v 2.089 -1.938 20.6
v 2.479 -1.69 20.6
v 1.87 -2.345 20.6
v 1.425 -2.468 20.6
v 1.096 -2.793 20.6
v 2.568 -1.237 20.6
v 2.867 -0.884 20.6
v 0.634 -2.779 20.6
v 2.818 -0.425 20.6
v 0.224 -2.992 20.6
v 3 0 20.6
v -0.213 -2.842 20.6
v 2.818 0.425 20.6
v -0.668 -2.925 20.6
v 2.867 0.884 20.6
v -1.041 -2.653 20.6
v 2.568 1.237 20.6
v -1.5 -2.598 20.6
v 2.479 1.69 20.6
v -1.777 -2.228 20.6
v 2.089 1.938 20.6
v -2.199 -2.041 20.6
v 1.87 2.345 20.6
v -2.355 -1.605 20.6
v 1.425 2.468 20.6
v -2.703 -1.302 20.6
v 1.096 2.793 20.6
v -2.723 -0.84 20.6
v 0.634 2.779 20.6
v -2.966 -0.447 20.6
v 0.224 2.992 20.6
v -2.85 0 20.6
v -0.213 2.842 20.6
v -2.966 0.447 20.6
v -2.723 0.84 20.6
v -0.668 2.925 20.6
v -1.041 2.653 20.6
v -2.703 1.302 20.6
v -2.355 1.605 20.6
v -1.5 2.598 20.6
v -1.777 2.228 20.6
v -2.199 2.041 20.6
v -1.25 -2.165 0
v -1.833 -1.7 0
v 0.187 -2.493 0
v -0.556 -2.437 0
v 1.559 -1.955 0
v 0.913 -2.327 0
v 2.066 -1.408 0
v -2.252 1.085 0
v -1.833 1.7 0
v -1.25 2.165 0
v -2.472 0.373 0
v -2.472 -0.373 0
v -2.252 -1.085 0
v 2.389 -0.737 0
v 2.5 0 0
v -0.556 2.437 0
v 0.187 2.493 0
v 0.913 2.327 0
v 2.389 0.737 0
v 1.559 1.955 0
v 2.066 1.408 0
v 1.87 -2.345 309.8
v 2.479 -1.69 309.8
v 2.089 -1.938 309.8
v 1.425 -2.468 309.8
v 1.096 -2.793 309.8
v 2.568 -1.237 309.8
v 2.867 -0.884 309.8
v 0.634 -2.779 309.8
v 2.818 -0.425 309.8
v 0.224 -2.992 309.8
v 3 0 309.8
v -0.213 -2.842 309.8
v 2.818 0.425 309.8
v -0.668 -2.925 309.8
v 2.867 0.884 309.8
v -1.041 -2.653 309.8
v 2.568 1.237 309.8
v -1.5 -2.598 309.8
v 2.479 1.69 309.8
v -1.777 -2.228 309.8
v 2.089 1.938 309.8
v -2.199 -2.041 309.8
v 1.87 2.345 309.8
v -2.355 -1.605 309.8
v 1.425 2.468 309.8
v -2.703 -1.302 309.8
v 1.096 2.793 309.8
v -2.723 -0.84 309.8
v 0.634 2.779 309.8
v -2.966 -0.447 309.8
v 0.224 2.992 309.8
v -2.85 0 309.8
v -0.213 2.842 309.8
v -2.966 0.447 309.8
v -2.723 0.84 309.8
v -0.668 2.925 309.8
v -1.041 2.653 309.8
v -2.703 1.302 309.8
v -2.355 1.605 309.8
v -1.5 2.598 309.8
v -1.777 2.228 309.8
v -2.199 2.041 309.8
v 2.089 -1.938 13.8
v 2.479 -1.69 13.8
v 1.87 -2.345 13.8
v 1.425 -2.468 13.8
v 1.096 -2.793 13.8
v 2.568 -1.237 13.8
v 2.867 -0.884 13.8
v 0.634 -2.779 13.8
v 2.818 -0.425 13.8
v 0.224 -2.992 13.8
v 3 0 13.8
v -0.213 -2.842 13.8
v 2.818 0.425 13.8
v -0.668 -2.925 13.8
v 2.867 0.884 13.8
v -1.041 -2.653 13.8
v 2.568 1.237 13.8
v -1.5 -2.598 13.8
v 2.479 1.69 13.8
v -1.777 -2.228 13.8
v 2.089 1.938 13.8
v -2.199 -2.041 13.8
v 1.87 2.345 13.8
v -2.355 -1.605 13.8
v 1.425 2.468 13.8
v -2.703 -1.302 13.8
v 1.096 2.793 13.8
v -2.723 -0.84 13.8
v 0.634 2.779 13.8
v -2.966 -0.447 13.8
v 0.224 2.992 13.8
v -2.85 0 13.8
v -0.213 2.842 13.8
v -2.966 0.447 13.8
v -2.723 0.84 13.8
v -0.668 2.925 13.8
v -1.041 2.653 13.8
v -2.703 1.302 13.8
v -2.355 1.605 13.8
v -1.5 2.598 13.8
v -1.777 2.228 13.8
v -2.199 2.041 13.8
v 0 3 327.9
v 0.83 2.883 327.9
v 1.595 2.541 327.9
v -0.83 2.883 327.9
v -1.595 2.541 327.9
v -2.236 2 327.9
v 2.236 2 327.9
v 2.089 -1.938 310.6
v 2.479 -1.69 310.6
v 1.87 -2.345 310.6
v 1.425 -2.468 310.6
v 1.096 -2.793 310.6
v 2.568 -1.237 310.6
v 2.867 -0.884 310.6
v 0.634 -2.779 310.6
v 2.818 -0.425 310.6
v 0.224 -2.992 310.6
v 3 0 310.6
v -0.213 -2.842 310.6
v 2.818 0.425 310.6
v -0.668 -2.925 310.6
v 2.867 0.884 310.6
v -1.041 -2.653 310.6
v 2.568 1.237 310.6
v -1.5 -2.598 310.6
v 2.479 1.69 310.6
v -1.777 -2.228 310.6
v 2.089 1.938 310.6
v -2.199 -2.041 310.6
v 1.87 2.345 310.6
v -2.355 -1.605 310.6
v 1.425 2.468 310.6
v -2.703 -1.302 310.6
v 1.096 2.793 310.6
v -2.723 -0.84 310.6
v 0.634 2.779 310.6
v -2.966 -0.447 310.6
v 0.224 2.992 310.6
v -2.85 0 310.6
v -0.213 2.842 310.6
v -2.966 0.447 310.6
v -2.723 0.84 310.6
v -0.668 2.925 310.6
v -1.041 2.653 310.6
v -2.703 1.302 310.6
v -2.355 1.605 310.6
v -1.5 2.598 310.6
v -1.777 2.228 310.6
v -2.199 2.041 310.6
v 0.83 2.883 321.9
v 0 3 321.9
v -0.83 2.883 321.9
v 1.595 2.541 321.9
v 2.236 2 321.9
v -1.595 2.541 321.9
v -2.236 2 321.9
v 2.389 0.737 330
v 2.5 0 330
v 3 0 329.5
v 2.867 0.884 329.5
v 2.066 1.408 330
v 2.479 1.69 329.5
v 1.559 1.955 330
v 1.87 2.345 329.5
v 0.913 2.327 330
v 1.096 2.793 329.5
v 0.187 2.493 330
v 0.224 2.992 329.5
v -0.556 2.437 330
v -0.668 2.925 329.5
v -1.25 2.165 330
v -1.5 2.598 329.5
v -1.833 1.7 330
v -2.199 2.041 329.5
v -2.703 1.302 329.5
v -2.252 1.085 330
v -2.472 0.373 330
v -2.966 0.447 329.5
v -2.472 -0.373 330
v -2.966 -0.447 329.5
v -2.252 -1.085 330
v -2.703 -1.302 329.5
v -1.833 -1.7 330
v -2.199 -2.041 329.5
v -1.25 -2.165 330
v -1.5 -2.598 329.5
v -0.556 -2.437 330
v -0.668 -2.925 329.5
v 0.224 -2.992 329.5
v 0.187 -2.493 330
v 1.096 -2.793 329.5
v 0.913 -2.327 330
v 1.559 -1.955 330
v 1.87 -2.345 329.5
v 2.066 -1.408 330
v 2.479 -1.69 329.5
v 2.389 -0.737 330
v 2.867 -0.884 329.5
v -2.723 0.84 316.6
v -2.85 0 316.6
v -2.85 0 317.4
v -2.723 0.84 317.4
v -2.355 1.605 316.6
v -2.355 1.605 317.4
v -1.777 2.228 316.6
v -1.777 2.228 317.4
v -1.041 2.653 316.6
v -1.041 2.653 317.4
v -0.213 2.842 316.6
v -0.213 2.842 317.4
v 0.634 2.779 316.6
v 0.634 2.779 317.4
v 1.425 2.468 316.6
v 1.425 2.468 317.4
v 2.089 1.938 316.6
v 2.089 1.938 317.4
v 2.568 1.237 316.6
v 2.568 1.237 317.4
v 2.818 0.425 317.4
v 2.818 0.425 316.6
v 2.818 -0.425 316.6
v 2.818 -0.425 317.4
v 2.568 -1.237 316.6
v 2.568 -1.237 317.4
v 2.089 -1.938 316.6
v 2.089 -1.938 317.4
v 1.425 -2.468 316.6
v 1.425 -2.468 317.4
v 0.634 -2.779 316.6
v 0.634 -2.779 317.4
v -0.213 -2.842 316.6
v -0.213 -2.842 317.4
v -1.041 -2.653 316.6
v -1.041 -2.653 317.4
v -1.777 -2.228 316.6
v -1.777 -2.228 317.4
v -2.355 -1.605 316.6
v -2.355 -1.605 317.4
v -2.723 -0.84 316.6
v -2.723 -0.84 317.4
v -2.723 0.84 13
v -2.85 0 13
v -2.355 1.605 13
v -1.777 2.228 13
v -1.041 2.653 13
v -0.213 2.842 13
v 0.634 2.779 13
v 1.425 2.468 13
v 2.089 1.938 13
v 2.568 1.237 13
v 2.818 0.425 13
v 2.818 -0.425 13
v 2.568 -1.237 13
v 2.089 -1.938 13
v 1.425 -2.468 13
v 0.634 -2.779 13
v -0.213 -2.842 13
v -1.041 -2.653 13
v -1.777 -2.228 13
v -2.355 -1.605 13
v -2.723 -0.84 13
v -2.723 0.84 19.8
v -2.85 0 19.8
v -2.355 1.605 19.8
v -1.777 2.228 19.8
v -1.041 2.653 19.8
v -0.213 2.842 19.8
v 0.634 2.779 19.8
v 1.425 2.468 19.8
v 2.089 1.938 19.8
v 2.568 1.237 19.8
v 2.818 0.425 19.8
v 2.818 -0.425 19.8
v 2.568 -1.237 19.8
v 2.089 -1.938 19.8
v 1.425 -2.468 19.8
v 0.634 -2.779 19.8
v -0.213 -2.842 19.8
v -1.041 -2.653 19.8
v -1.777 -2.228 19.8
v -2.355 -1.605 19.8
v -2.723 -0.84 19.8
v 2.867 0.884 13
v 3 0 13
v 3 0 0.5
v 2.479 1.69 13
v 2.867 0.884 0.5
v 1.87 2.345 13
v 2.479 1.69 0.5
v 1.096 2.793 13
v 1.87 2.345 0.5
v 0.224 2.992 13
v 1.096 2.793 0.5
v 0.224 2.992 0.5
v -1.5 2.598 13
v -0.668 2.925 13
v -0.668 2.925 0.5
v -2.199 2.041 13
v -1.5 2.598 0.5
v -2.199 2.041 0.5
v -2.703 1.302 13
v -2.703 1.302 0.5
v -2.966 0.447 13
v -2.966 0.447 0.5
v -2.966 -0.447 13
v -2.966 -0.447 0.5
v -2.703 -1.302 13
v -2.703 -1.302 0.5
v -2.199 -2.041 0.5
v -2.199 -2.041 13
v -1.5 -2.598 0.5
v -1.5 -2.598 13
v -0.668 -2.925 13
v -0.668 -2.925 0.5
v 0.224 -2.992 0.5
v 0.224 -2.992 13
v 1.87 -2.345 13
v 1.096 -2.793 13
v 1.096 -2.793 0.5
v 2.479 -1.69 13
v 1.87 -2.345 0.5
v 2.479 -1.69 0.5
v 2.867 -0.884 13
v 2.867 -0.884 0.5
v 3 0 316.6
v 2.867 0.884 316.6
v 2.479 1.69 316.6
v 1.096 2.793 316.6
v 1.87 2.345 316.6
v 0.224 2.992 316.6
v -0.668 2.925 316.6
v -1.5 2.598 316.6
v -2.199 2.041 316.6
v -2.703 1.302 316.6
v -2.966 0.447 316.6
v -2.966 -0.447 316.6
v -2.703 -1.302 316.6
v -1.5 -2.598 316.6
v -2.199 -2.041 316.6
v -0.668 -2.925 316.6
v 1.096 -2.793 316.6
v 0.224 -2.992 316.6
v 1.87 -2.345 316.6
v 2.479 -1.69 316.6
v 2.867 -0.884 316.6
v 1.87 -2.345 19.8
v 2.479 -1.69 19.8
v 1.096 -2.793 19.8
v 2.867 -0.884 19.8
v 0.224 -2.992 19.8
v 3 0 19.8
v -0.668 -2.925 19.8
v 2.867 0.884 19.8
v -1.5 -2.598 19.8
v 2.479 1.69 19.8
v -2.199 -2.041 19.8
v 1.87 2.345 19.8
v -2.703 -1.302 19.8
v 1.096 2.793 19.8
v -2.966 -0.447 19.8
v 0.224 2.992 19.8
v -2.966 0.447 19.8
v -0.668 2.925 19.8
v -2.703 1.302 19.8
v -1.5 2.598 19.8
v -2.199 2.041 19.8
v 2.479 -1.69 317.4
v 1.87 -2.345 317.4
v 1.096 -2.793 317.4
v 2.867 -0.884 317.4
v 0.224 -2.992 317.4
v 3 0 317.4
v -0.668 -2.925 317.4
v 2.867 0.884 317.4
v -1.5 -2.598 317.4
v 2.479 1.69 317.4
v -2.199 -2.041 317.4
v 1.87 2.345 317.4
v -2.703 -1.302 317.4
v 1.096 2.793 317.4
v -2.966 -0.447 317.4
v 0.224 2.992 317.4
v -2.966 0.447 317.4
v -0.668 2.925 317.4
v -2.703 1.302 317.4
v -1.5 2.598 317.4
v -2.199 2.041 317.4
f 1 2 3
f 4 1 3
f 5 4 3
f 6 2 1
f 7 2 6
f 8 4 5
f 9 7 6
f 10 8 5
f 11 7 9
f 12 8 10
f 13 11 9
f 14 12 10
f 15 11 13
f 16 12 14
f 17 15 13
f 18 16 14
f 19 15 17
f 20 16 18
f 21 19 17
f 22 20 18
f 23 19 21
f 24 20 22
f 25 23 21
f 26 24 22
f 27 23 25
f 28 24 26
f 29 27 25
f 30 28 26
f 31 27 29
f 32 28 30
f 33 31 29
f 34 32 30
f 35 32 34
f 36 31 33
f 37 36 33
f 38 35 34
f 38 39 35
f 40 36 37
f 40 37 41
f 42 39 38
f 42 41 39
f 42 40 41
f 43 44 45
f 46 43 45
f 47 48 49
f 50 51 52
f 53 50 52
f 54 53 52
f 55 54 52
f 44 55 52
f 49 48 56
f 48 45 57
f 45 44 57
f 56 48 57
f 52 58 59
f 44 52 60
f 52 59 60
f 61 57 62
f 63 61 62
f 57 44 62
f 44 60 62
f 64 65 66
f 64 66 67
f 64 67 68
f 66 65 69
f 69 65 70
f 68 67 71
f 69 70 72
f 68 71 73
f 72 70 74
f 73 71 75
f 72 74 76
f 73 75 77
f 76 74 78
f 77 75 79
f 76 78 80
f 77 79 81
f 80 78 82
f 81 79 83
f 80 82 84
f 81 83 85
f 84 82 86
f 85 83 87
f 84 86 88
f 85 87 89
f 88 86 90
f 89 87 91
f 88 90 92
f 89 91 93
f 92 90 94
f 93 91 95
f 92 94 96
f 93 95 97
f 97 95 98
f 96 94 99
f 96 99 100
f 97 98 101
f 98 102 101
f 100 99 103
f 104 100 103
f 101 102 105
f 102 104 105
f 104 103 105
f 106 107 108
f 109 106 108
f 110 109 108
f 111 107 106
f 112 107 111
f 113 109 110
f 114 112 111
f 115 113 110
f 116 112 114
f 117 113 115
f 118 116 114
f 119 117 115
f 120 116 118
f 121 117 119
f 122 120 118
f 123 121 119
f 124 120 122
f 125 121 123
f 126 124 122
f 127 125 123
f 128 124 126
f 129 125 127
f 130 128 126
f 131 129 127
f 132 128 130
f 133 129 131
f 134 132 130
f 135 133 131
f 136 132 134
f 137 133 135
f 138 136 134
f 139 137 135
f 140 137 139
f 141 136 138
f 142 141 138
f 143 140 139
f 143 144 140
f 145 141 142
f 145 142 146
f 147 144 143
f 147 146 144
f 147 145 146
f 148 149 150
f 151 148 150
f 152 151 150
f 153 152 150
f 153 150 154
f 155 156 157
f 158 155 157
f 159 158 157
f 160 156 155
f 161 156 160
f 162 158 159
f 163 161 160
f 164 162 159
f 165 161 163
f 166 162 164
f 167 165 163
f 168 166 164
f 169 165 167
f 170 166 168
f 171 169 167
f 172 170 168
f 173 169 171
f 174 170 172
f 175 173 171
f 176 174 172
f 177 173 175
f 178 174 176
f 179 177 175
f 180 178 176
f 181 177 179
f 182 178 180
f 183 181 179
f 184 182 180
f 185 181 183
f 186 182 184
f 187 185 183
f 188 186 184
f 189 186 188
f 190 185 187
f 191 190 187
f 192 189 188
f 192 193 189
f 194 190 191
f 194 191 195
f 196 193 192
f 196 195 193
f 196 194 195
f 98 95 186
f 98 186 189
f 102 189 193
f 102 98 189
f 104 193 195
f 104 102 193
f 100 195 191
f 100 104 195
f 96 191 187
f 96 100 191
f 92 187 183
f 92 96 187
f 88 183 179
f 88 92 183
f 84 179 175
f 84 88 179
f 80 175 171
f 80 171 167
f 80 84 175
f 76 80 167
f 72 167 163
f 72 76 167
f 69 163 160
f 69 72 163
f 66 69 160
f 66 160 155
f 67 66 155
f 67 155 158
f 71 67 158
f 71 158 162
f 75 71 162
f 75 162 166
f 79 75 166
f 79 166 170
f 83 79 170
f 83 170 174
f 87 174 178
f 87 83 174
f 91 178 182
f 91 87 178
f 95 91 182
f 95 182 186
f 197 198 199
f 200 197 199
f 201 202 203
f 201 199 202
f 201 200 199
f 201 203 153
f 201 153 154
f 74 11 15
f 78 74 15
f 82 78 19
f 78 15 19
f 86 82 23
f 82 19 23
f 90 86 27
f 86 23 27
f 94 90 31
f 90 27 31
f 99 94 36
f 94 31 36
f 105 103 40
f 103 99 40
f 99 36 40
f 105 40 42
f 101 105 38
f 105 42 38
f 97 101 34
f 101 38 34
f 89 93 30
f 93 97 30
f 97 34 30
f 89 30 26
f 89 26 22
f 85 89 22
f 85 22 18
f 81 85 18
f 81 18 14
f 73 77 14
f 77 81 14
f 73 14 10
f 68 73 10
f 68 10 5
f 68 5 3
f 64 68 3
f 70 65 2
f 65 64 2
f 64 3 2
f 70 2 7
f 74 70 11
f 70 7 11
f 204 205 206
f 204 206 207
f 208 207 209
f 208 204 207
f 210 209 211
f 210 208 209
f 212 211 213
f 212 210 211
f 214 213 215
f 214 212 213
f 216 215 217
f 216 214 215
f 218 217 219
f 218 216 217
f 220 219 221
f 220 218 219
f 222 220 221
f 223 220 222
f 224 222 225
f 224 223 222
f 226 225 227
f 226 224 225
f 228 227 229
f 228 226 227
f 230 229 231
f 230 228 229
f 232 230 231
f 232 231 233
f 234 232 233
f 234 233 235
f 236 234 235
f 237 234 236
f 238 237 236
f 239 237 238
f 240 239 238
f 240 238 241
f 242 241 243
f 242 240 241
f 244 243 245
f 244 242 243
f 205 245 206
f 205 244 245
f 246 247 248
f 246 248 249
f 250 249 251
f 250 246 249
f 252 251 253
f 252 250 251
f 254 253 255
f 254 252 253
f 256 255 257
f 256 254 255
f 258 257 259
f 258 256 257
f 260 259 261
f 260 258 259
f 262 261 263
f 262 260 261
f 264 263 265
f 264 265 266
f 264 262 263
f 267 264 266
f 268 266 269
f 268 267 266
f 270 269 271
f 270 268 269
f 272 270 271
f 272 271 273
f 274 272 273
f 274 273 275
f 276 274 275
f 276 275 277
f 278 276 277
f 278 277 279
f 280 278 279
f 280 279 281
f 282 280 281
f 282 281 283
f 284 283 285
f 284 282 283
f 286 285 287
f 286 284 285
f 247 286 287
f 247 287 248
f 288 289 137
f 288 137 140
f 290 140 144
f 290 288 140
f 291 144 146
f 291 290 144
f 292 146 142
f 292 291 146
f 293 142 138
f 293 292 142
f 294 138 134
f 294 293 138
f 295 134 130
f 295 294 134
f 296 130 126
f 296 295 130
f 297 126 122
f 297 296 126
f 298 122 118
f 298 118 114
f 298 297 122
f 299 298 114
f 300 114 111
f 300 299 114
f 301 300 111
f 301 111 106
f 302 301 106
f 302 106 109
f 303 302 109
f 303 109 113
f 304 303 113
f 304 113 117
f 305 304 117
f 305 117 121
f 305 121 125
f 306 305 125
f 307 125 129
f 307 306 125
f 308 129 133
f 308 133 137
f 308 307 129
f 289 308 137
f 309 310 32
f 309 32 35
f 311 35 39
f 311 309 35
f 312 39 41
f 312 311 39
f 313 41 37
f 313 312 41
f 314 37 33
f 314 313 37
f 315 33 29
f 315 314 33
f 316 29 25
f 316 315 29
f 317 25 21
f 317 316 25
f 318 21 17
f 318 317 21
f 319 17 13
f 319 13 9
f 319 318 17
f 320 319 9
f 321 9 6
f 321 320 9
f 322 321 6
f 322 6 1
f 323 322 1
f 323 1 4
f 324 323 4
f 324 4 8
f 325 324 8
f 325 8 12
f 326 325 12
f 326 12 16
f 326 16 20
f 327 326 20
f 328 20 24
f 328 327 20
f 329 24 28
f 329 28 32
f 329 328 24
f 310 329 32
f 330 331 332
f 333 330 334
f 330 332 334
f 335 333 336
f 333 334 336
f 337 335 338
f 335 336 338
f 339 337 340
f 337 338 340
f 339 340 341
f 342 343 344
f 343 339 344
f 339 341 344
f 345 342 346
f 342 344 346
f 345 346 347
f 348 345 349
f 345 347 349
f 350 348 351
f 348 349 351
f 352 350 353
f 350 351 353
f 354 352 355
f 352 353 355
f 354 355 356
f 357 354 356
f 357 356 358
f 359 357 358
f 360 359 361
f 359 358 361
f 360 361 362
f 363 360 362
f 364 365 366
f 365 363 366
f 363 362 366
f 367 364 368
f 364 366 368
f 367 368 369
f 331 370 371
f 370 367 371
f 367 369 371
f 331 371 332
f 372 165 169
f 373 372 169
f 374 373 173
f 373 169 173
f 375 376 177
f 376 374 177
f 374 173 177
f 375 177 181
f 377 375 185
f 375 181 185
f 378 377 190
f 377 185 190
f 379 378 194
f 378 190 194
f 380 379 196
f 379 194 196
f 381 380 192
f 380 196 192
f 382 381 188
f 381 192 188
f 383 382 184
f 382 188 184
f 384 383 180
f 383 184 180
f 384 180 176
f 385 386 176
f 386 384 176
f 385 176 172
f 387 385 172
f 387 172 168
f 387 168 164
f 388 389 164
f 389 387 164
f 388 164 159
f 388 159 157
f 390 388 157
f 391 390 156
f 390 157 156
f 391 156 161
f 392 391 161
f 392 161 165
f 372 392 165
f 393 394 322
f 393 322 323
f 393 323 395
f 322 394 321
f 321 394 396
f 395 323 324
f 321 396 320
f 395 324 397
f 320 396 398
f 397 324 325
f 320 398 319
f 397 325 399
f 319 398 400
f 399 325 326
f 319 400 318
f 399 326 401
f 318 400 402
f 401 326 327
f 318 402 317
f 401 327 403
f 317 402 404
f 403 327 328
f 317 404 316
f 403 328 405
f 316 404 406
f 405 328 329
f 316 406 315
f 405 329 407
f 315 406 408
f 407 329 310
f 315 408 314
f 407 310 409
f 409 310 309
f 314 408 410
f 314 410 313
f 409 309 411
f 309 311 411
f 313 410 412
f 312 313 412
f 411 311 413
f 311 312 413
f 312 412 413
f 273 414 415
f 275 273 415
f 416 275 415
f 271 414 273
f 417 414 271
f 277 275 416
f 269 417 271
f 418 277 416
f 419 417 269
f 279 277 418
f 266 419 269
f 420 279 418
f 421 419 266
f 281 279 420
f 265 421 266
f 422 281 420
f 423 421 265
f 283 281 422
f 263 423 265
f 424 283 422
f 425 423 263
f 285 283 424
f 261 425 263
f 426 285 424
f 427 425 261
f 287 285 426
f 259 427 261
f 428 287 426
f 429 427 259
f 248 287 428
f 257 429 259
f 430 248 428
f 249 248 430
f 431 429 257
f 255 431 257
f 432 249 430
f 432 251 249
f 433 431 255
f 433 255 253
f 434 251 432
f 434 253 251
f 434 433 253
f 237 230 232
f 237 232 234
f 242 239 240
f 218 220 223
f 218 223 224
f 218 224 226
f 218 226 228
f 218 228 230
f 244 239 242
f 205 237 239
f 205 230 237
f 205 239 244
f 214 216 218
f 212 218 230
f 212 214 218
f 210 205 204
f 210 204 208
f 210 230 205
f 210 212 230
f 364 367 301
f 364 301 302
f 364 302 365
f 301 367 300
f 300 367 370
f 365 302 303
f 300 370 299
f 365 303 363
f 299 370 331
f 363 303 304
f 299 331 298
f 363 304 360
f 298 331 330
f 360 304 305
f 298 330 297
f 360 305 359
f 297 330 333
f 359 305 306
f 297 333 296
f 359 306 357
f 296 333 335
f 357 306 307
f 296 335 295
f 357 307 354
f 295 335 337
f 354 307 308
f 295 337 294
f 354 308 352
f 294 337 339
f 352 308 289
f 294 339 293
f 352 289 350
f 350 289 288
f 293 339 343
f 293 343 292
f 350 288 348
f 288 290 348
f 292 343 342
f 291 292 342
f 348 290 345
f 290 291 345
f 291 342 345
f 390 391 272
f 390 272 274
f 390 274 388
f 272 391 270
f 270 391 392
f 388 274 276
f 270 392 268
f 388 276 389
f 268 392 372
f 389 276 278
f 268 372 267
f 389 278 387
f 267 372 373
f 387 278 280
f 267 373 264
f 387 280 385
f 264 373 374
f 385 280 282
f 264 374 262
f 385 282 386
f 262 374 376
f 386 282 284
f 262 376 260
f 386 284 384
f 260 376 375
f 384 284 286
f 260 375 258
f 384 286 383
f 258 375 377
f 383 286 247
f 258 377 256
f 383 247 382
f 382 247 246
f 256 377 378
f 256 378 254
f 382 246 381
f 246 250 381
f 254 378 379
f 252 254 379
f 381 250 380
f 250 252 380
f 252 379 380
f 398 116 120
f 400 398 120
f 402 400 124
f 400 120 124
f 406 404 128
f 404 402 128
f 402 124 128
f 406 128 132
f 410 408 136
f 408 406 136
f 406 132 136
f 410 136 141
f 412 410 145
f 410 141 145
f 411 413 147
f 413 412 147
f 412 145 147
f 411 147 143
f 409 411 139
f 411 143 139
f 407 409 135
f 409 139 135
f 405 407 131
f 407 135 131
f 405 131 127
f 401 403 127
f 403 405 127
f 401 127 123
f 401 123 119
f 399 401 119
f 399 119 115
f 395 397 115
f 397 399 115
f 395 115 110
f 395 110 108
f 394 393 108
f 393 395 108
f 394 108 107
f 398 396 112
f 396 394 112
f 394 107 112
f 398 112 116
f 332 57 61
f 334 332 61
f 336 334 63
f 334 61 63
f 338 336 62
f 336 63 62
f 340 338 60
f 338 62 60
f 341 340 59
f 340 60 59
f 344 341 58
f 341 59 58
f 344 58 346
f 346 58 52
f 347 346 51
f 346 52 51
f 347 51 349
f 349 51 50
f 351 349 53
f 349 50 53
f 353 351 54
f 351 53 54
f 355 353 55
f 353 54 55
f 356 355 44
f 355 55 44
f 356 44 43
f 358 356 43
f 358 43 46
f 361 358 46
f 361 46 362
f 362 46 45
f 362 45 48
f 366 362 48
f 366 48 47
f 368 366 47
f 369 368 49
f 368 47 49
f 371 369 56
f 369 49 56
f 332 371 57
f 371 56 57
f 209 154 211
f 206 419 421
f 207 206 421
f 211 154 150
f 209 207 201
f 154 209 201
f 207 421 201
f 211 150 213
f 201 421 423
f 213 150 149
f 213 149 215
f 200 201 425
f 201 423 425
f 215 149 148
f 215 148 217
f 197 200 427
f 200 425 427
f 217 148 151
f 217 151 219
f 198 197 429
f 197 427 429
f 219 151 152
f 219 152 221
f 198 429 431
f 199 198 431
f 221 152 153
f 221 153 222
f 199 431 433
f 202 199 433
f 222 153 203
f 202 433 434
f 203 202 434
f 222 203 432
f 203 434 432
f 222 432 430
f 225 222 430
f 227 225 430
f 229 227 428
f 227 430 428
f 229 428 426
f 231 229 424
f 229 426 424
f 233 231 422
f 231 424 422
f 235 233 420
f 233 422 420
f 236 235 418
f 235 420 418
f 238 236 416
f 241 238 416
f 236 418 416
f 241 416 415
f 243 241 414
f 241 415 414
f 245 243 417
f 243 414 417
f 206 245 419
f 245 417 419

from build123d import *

# Parameters (mm, degrees)
SKETCH1_R           = 3
BOSS_EXTRUDE1_DEPTH = 330
CUT_EXTRUDE1_START  = -13
SKETCH2_R           = 3
SKETCH2_R_2         = 2.85
CUT_EXTRUDE1_DEPTH  = 0.8
CUT_EXTRUDE2_START  = -6
SKETCH3_R           = 3
SKETCH3_R_2         = 2.85
CUT_EXTRUDE2_DEPTH  = 0.8
CUT_EXTRUDE3_START  = -296
SKETCH3_2_R         = 3
SKETCH3_2_R_2       = 2.85
CUT_EXTRUDE3_DEPTH  = 0.8
CUT_EXTRUDE4_START  = -302.8
SKETCH3_3_R         = 3
SKETCH3_3_R_2       = 2.85
CUT_EXTRUDE4_DEPTH  = 0.8
CUT_EXTRUDE5_START  = 3
SKETCH4_W           = 6
SKETCH4_H           = 6
CUT_EXTRUDE5_DEPTH  = 1
CHAMFER1_SIZE       = 0.5


with BuildPart() as part:
    # Sketch1 → Boss-Extrude1 (new body)
    with BuildSketch(Plane.XY):
        Circle(SKETCH1_R)
    extrude(amount=BOSS_EXTRUDE1_DEPTH)

    # Sketch2 → Cut-Extrude1 (cut)
    with BuildSketch(Plane(origin=(0, 0, 0), x_dir=(-1, 0, 0), z_dir=(0, 0, -1)).offset(CUT_EXTRUDE1_START)):
        Circle(SKETCH2_R)
        Circle(SKETCH2_R_2, mode=Mode.SUBTRACT)
    extrude(amount=-CUT_EXTRUDE1_DEPTH, mode=Mode.SUBTRACT)

    # Sketch3 → Cut-Extrude2 (cut)
    with BuildSketch(Plane(origin=(0, 0, 13.8), x_dir=(-1, 0, 0), z_dir=(0, 0, -1)).offset(CUT_EXTRUDE2_START)):
        Circle(SKETCH3_R)
        Circle(SKETCH3_R_2, mode=Mode.SUBTRACT)
    extrude(amount=-CUT_EXTRUDE2_DEPTH, mode=Mode.SUBTRACT)

    # Sketch3<2> → Cut-Extrude3 (cut)
    with BuildSketch(Plane(origin=(0, 0, 13.8), x_dir=(-1, 0, 0), z_dir=(0, 0, -1)).offset(CUT_EXTRUDE3_START)):
        Circle(SKETCH3_2_R)
        Circle(SKETCH3_2_R_2, mode=Mode.SUBTRACT)
    extrude(amount=-CUT_EXTRUDE3_DEPTH, mode=Mode.SUBTRACT)

    # Sketch3<3> → Cut-Extrude4 (cut)
    with BuildSketch(Plane(origin=(0, 0, 13.8), x_dir=(-1, 0, 0), z_dir=(0, 0, -1)).offset(CUT_EXTRUDE4_START)):
        Circle(SKETCH3_3_R)
        Circle(SKETCH3_3_R_2, mode=Mode.SUBTRACT)
    extrude(amount=-CUT_EXTRUDE4_DEPTH, mode=Mode.SUBTRACT)

    # Sketch4 → Cut-Extrude5 (cut)
    with BuildSketch(Plane(origin=(0, 0, 0), x_dir=(1, 0, 0), z_dir=(0, 1, 0)).offset(CUT_EXTRUDE5_START)):
        with Locations((0, -324.9)):
            Rectangle(SKETCH4_W, SKETCH4_H)
    extrude(amount=-CUT_EXTRUDE5_DEPTH, mode=Mode.SUBTRACT)

    # Chamfer1
    chamfer1_edges = [part.edges().sort_by_distance(p)[0] for p in [
        (-3, 0, 0),
        (-3, 0, 330),
    ]]
    chamfer(chamfer1_edges, length=CHAMFER1_SIZE)


solid = part.part
